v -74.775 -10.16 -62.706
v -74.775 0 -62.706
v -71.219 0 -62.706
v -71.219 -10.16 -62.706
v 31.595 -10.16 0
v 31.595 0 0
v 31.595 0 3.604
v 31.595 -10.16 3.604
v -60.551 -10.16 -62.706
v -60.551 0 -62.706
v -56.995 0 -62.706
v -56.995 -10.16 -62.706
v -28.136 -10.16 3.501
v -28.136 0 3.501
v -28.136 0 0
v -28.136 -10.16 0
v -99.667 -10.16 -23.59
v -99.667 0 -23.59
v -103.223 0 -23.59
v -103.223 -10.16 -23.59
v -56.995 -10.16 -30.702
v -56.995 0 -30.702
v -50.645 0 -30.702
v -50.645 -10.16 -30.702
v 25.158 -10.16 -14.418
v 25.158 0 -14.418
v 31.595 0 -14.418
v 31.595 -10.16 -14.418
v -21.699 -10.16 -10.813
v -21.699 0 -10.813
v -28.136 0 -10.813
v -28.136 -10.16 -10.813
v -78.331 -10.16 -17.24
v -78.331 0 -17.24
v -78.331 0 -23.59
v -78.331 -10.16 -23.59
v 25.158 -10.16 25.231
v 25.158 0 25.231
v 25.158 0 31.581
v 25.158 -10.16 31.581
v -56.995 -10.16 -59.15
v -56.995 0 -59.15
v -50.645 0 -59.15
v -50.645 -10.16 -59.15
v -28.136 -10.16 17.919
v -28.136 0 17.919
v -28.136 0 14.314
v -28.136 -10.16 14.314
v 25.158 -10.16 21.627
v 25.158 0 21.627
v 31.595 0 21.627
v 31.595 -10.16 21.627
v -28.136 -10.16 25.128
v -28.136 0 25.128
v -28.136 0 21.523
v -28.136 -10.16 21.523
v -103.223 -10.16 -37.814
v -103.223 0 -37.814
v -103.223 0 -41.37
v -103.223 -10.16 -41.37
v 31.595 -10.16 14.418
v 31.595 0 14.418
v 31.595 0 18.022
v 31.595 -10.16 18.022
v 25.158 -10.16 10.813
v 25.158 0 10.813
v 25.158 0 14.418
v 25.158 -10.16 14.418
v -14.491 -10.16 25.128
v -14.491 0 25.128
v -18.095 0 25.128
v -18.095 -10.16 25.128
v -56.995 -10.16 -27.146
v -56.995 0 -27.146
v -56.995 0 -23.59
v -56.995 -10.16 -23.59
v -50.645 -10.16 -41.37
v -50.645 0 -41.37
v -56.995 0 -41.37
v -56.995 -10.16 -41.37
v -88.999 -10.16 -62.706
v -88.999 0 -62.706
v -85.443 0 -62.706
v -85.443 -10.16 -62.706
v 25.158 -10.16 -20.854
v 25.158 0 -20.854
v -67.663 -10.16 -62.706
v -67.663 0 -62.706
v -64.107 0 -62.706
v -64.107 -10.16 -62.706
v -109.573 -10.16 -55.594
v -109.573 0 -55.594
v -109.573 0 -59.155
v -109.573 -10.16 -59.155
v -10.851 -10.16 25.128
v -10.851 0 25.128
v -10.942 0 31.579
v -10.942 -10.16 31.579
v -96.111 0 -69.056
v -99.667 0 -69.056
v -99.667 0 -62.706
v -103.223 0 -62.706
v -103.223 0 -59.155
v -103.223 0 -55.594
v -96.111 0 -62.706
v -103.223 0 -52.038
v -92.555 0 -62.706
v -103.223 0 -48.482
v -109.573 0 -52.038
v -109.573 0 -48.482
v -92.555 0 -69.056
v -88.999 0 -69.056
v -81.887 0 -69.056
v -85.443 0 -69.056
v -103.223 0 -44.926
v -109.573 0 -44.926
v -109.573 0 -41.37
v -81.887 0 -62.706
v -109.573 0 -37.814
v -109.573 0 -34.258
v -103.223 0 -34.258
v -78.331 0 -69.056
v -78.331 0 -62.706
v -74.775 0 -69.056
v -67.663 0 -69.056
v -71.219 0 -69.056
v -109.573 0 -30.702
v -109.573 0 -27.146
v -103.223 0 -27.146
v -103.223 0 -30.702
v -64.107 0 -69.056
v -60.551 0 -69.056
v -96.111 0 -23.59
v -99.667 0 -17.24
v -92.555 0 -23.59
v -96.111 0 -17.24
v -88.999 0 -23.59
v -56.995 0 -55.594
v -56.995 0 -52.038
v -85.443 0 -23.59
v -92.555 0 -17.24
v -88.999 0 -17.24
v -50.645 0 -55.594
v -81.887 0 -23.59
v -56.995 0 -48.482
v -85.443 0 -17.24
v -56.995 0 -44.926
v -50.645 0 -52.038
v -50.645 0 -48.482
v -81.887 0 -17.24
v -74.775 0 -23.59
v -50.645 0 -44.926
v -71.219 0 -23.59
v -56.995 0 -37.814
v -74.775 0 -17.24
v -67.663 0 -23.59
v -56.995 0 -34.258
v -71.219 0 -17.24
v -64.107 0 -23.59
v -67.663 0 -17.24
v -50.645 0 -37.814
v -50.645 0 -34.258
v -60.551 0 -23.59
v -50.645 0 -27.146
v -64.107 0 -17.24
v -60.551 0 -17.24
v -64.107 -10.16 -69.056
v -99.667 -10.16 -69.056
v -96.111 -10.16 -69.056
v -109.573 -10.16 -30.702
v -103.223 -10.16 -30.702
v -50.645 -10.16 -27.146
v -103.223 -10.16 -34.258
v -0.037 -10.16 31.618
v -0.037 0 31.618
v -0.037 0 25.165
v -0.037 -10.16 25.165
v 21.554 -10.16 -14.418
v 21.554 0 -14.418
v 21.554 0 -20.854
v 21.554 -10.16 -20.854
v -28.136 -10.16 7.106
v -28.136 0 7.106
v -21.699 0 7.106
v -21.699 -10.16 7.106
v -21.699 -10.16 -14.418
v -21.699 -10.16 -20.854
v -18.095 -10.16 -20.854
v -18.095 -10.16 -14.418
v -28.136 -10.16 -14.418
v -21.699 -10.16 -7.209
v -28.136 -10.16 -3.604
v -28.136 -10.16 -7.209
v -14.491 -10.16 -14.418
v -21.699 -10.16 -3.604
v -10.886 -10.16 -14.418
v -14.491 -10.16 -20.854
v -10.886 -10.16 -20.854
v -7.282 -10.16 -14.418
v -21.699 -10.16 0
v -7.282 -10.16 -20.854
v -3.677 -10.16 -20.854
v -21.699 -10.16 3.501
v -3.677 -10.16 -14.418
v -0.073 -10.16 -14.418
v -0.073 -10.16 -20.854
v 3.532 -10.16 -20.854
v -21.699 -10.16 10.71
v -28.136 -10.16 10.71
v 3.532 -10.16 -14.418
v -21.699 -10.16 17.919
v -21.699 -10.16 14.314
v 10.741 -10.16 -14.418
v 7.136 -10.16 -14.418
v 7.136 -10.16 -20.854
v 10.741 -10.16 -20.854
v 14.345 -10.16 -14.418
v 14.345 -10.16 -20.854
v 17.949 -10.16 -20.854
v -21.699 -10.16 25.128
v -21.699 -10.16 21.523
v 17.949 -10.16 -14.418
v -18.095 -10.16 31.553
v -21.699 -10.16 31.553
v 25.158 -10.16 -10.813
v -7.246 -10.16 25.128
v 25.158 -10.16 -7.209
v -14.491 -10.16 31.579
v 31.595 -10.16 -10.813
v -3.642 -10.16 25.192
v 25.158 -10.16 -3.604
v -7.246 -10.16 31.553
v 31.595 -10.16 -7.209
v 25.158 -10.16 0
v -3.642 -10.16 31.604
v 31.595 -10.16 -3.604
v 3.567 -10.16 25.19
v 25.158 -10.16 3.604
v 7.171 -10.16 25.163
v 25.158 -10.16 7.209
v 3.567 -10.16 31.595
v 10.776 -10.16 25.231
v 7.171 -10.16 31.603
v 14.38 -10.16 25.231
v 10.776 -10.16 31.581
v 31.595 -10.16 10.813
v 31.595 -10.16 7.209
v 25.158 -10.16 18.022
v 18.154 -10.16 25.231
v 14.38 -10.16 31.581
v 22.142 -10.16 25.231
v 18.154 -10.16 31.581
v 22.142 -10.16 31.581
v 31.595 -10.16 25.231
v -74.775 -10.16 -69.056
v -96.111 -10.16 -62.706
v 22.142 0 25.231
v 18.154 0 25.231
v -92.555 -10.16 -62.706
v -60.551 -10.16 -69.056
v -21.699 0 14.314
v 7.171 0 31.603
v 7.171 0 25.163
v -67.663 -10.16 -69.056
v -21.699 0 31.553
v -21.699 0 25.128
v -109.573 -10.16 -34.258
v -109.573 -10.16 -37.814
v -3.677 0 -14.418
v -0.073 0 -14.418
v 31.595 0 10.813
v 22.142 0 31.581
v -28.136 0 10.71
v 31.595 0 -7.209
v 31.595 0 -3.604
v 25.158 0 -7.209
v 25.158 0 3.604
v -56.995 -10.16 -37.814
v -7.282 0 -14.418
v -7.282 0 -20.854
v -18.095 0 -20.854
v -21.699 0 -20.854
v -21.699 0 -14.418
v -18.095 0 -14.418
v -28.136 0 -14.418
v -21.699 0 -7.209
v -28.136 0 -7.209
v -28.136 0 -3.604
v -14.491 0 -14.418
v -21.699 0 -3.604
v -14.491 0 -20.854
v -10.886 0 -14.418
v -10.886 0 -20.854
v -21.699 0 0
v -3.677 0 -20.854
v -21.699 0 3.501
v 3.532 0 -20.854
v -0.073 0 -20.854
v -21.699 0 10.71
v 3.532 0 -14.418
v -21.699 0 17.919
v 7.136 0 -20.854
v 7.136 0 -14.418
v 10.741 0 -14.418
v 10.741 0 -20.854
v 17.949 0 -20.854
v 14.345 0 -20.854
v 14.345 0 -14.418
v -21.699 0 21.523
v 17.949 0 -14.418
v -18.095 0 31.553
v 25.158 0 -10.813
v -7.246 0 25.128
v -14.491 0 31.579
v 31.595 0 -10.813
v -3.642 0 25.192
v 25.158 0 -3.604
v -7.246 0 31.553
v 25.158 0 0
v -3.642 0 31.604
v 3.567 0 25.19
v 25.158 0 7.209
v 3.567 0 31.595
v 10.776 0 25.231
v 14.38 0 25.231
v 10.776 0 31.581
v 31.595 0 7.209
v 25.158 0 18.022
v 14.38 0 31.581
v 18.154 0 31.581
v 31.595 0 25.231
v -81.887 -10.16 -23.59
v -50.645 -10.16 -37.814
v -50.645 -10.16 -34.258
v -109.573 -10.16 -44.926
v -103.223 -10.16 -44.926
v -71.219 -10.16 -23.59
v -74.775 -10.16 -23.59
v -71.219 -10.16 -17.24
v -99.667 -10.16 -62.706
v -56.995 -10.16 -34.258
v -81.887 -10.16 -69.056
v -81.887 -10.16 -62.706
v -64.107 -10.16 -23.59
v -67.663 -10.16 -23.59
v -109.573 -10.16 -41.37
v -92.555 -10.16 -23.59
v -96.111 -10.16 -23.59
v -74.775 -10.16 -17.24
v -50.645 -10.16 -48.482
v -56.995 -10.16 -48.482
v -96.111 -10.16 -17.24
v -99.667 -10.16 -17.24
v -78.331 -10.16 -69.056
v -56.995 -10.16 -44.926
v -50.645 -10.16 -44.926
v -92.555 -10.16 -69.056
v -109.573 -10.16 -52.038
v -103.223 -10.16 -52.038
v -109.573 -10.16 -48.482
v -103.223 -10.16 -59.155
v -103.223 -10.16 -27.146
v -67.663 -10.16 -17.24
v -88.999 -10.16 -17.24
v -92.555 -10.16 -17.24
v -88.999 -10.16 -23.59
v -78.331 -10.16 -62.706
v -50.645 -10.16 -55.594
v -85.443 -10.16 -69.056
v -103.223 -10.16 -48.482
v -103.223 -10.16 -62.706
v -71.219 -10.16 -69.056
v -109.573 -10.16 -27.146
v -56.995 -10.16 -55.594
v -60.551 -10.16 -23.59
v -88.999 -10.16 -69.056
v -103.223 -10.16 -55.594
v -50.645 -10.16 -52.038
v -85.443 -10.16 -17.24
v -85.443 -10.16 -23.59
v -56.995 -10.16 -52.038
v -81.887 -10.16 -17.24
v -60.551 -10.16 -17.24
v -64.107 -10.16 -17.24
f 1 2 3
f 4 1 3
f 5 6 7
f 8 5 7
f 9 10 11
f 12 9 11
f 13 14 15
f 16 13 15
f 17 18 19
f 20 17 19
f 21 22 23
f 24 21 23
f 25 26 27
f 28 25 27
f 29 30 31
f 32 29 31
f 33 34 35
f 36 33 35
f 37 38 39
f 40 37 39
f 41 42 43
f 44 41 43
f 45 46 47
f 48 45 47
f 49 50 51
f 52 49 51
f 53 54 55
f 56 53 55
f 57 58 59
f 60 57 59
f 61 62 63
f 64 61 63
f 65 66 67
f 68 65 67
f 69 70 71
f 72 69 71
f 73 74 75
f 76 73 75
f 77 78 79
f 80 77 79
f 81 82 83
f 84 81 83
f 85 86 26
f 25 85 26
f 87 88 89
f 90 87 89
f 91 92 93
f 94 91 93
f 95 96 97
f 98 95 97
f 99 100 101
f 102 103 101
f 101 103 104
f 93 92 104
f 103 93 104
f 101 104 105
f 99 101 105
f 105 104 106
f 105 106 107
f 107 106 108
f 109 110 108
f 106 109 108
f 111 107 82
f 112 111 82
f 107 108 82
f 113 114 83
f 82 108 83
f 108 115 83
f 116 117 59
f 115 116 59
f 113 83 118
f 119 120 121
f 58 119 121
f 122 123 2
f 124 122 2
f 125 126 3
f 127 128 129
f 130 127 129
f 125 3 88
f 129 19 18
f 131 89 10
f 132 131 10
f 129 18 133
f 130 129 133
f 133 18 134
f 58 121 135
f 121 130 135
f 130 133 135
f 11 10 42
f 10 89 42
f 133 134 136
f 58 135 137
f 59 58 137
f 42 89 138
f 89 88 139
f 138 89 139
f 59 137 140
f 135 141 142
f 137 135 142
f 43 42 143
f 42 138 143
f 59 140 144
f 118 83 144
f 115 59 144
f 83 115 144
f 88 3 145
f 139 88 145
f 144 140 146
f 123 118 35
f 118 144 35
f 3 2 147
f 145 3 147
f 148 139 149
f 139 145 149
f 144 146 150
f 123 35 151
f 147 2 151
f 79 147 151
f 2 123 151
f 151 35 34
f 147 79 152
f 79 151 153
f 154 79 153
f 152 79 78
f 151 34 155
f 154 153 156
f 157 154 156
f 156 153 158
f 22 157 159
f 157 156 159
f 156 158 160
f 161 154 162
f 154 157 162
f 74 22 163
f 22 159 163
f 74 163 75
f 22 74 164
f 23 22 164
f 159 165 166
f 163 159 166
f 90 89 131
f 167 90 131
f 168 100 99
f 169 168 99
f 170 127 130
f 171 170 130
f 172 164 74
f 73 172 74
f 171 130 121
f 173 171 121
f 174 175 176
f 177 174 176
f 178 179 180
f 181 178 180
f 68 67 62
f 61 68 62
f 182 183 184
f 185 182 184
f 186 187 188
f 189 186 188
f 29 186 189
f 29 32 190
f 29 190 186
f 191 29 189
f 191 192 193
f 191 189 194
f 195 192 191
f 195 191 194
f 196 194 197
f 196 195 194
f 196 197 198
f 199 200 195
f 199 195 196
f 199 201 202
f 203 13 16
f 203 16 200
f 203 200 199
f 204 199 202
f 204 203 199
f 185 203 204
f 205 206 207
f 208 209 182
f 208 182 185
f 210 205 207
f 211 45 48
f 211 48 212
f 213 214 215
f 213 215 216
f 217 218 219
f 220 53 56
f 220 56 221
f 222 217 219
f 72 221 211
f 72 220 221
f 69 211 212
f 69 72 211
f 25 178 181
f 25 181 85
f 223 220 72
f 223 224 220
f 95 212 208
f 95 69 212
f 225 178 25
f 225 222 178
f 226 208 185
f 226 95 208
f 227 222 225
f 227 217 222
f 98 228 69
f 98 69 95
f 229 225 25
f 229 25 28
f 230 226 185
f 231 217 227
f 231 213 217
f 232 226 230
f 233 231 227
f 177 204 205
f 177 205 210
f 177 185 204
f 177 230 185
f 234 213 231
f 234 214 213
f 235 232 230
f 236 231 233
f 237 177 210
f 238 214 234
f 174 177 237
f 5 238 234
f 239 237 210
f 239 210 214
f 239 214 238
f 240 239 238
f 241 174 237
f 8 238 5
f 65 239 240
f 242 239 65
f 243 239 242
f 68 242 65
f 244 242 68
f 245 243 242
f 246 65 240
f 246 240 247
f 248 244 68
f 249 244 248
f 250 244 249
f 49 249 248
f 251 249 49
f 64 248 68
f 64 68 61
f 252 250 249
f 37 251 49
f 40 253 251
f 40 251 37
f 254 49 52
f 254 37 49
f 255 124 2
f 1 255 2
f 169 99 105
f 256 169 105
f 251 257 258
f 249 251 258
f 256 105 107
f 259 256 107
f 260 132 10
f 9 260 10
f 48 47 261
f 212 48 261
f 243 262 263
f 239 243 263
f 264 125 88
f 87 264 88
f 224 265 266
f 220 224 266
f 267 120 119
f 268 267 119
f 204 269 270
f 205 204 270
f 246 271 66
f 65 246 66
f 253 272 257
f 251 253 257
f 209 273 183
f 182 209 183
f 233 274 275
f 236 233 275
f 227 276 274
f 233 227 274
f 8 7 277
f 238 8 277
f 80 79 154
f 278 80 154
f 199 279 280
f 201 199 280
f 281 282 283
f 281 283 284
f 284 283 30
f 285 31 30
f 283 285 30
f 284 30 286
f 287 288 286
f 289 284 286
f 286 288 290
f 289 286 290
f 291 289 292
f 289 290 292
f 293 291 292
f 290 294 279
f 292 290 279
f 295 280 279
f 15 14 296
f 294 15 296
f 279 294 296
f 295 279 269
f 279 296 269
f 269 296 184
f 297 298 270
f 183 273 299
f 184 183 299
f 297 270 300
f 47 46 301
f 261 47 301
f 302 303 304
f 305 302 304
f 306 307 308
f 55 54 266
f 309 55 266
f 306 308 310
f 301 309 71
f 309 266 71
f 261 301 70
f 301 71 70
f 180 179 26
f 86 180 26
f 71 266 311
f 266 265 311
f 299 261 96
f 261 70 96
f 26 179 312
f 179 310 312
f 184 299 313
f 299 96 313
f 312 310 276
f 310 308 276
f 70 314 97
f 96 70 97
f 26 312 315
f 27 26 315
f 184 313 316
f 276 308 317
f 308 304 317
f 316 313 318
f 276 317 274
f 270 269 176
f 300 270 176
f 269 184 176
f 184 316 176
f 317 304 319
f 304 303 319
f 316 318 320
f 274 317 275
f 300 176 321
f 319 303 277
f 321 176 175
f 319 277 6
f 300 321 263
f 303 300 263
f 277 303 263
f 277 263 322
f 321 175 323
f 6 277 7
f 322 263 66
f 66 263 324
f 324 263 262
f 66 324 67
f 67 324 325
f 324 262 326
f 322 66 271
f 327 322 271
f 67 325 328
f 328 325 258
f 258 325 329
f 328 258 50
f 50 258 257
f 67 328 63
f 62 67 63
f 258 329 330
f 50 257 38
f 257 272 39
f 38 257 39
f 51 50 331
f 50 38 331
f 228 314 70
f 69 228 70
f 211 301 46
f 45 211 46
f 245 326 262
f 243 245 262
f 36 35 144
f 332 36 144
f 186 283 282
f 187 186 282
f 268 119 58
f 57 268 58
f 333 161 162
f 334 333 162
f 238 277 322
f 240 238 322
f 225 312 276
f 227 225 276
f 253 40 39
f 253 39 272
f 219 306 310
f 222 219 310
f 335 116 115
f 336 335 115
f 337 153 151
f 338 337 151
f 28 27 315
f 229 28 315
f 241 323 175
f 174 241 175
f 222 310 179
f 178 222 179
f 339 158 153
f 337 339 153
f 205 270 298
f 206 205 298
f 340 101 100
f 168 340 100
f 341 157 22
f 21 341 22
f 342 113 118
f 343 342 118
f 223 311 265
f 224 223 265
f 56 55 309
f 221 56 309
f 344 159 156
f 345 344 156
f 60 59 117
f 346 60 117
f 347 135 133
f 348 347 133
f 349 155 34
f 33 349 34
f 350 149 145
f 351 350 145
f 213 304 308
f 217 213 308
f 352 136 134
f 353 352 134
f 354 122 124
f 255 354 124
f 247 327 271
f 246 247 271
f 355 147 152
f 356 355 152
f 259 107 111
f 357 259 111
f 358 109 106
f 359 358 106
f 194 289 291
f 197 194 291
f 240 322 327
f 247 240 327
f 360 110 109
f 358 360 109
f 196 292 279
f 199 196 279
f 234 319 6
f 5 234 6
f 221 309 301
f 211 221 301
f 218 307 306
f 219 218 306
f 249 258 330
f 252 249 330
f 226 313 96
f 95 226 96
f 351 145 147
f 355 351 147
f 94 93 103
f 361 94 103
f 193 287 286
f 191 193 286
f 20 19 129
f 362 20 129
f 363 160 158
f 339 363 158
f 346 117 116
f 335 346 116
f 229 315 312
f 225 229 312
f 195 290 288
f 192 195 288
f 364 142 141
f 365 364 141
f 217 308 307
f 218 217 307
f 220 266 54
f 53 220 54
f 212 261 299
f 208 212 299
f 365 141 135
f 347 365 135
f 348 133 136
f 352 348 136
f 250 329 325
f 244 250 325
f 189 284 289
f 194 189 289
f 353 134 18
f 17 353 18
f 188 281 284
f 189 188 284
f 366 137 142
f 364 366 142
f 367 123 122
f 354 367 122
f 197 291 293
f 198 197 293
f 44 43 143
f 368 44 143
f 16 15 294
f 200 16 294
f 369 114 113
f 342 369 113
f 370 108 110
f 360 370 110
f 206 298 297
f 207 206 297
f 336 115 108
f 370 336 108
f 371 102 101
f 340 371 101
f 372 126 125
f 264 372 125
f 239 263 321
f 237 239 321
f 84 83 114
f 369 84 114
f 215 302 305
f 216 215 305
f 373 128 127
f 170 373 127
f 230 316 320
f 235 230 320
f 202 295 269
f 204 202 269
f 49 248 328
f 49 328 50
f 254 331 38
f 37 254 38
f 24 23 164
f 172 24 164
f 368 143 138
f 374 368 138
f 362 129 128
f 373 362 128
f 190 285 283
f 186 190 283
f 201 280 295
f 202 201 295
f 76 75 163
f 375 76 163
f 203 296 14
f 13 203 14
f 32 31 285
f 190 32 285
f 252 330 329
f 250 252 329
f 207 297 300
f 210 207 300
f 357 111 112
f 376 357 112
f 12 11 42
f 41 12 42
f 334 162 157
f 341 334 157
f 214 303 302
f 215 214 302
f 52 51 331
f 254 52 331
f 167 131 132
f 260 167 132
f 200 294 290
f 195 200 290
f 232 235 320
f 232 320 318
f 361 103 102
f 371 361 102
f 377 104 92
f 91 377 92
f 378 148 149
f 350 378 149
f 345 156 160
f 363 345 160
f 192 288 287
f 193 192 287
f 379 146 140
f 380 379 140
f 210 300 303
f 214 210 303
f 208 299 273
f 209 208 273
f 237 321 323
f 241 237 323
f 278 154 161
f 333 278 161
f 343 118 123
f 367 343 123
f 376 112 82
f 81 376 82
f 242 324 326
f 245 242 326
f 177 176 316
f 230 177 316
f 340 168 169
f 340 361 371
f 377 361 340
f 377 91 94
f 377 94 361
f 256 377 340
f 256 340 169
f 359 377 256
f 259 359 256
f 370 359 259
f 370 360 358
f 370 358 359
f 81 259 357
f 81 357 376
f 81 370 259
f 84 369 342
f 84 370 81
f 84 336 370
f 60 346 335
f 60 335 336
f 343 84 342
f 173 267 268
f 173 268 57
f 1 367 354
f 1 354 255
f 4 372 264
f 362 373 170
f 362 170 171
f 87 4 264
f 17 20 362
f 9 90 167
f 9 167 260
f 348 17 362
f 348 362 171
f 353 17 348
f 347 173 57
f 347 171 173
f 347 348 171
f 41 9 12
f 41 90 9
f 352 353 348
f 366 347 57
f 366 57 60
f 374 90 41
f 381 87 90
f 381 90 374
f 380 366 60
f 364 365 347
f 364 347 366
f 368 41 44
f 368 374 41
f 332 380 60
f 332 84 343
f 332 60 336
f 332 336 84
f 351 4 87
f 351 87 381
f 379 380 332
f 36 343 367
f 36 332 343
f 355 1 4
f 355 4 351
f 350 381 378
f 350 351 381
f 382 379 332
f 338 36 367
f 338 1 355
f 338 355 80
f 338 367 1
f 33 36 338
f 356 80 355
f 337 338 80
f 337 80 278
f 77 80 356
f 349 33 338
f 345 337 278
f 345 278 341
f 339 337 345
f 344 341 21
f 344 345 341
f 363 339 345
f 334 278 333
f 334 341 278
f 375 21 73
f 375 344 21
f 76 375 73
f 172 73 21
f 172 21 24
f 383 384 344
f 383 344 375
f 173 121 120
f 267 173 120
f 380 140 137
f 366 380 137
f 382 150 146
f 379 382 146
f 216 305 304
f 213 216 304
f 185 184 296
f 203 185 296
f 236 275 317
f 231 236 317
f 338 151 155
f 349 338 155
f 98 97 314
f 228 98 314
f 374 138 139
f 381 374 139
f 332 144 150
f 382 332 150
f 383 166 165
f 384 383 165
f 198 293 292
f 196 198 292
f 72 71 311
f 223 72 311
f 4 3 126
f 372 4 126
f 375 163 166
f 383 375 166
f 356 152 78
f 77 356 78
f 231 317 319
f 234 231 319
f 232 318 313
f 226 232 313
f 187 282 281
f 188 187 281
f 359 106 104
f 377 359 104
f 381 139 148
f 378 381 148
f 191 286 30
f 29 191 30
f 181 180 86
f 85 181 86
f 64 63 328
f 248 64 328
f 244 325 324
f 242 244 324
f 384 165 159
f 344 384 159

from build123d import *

# Parameters (mm, degrees)
F1_DEPTH = 10.16
F3_DEPTH = 10.16


with BuildPart() as f1:
    # F0 (on Front) → F1 (new body)
    with BuildSketch(Plane.XZ):
        Polygon((-7.246204, 25.127795), (-10.850636, 25.127795), (-10.942347, 31.578782), (-14.490504, 31.578782), (-14.490504, 25.127795), (-18.094936, 25.127795), (-18.094936, 31.55316), (-21.699369, 31.55316), (-21.699369, 25.127795), (-28.135855, 25.127795), (-28.135855, 21.523363), (-21.699369, 21.523363), (-21.699369, 17.91893), (-28.135855, 17.91893), (-28.135855, 14.314498), (-21.699369, 14.314498), (-21.699369, 10.710065), (-28.135855, 10.710065), (-28.135855, 7.105633), (-21.699369, 7.105633), (-21.699369, 3.5012), (-28.135855, 3.5012), (-28.135855, 0), (-21.699369, 0), (-21.699369, -3.604432), (-28.135855, -3.604432), (-28.135855, -7.208865), (-21.699369, -7.208865), (-21.699369, -10.813297), (-28.135855, -10.813297), (-28.135855, -14.41773), (-21.699369, -14.41773), (-21.699369, -20.854216), (-18.094936, -20.854216), (-18.094936, -14.41773), (-14.490504, -14.41773), (-14.490504, -20.854216), (-10.886071, -20.854216), (-10.886071, -14.41773), (-7.281639, -14.41773), (-7.281639, -20.854216), (-3.677206, -20.854216), (-3.677206, -14.41773), (-0.072774, -14.41773), (-0.072774, -20.854216), (3.531659, -20.854216), (3.531659, -14.41773), (7.136091, -14.41773), (7.136091, -20.854216), (10.740524, -20.854216), (10.740524, -14.41773), (14.344956, -14.41773), (14.344956, -20.854216), (17.949388, -20.854216), (17.949388, -14.41773), (21.553821, -14.41773), (21.553821, -20.854216), (25.158253, -20.854216), (25.158253, -14.41773), (31.59474, -14.41773), (31.59474, -10.813297), (25.158253, -10.813297), (25.158253, -7.208865), (31.59474, -7.208865), (31.59474, -3.604432), (25.158253, -3.604432), (25.158253, 0), (31.59474, 0), (31.59474, 3.604432), (25.158253, 3.604432), (25.158253, 7.208865), (31.59474, 7.208865), (31.59474, 10.813297), (25.158253, 10.813297), (25.158253, 14.41773), (31.59474, 14.41773), (31.59474, 18.022162), (25.158253, 18.022162), (25.158253, 21.626595), (31.59474, 21.626595), (31.59474, 25.231027), (25.158253, 25.231027), (25.158253, 31.581027), (22.141514, 31.581027), (22.141514, 25.231027), (18.153843, 25.231027), (18.153843, 31.581027), (14.380122, 31.581027), (14.380122, 25.231027), (10.77569, 25.231027), (10.77569, 31.581027), (7.171323, 31.602797), (7.171323, 25.162738), (3.566995, 25.190168), (3.566995, 31.595162), (-0.037368, 31.617542), (-0.037368, 25.164533), (-3.641693, 25.192317), (-3.641693, 31.604404), (-7.246204, 31.55316), align=None)
    extrude(amount=F1_DEPTH)


with BuildPart() as f3:
    # F2 (on Front) → F3 (new body)
    with BuildSketch(Plane.XZ):
        Polygon((-103.22319, -62.705836), (-99.66719, -62.705836), (-99.66719, -69.055836), (-96.11119, -69.055836), (-96.11119, -62.705836), (-92.55519, -62.705836), (-92.55519, -69.055836), (-88.99919, -69.055836), (-88.99919, -62.705836), (-85.44319, -62.705836), (-85.44319, -69.055836), (-81.88719, -69.055836), (-81.88719, -62.705836), (-78.33119, -62.705836), (-78.33119, -69.055836), (-74.77519, -69.055836), (-74.77519, -62.705836), (-71.21919, -62.705836), (-71.21919, -69.055836), (-67.66319, -69.055836), (-67.66319, -62.705836), (-64.10719, -62.705836), (-64.10719, -69.055836), (-60.55119, -69.055836), (-60.55119, -62.705836), (-56.99519, -62.705836), (-56.99519, -59.149836), (-50.64519, -59.149836), (-50.64519, -55.593836), (-56.99519, -55.593836), (-56.99519, -52.037836), (-50.64519, -52.037836), (-50.64519, -48.481836), (-56.99519, -48.481836), (-56.99519, -44.925836), (-50.64519, -44.925836), (-50.64519, -41.369836), (-56.99519, -41.369836), (-56.99519, -37.813836), (-50.64519, -37.813836), (-50.64519, -34.257836), (-56.99519, -34.257836), (-56.99519, -30.701836), (-50.64519, -30.701836), (-50.64519, -27.145836), (-56.99519, -27.145836), (-56.99519, -23.589836), (-60.55119, -23.589836), (-60.55119, -17.239836), (-64.10719, -17.239836), (-64.10719, -23.589836), (-67.66319, -23.589836), (-67.66319, -17.239836), (-71.21919, -17.239836), (-71.21919, -23.589836), (-74.77519, -23.589836), (-74.77519, -17.239836), (-78.33119, -17.239836), (-78.33119, -23.589836), (-81.88719, -23.589836), (-81.88719, -17.239836), (-85.44319, -17.239836), (-85.44319, -23.589836), (-88.99919, -23.589836), (-88.99919, -17.239836), (-92.55519, -17.239836), (-92.55519, -23.589836), (-96.11119, -23.589836), (-96.11119, -17.239836), (-99.66719, -17.239836), (-99.66719, -23.589836), (-103.22319, -23.589836), (-103.22319, -27.145836), (-109.57319, -27.145836), (-109.57319, -30.701836), (-103.22319, -30.701836), (-103.22319, -34.257836), (-109.57319, -34.257836), (-109.57319, -37.813836), (-103.22319, -37.813836), (-103.22319, -41.369836), (-109.57319, -41.369836), (-109.57319, -44.925836), (-103.22319, -44.925836), (-103.22319, -48.481836), (-109.57319, -48.481836), (-109.57319, -52.037836), (-103.22319, -52.037836), (-103.22319, -55.593836), (-109.57319, -55.593836), (-109.57319, -59.154585), (-103.22319, -59.154585), align=None)
    extrude(amount=F3_DEPTH)


solid = Compound([f1.part, f3.part])
